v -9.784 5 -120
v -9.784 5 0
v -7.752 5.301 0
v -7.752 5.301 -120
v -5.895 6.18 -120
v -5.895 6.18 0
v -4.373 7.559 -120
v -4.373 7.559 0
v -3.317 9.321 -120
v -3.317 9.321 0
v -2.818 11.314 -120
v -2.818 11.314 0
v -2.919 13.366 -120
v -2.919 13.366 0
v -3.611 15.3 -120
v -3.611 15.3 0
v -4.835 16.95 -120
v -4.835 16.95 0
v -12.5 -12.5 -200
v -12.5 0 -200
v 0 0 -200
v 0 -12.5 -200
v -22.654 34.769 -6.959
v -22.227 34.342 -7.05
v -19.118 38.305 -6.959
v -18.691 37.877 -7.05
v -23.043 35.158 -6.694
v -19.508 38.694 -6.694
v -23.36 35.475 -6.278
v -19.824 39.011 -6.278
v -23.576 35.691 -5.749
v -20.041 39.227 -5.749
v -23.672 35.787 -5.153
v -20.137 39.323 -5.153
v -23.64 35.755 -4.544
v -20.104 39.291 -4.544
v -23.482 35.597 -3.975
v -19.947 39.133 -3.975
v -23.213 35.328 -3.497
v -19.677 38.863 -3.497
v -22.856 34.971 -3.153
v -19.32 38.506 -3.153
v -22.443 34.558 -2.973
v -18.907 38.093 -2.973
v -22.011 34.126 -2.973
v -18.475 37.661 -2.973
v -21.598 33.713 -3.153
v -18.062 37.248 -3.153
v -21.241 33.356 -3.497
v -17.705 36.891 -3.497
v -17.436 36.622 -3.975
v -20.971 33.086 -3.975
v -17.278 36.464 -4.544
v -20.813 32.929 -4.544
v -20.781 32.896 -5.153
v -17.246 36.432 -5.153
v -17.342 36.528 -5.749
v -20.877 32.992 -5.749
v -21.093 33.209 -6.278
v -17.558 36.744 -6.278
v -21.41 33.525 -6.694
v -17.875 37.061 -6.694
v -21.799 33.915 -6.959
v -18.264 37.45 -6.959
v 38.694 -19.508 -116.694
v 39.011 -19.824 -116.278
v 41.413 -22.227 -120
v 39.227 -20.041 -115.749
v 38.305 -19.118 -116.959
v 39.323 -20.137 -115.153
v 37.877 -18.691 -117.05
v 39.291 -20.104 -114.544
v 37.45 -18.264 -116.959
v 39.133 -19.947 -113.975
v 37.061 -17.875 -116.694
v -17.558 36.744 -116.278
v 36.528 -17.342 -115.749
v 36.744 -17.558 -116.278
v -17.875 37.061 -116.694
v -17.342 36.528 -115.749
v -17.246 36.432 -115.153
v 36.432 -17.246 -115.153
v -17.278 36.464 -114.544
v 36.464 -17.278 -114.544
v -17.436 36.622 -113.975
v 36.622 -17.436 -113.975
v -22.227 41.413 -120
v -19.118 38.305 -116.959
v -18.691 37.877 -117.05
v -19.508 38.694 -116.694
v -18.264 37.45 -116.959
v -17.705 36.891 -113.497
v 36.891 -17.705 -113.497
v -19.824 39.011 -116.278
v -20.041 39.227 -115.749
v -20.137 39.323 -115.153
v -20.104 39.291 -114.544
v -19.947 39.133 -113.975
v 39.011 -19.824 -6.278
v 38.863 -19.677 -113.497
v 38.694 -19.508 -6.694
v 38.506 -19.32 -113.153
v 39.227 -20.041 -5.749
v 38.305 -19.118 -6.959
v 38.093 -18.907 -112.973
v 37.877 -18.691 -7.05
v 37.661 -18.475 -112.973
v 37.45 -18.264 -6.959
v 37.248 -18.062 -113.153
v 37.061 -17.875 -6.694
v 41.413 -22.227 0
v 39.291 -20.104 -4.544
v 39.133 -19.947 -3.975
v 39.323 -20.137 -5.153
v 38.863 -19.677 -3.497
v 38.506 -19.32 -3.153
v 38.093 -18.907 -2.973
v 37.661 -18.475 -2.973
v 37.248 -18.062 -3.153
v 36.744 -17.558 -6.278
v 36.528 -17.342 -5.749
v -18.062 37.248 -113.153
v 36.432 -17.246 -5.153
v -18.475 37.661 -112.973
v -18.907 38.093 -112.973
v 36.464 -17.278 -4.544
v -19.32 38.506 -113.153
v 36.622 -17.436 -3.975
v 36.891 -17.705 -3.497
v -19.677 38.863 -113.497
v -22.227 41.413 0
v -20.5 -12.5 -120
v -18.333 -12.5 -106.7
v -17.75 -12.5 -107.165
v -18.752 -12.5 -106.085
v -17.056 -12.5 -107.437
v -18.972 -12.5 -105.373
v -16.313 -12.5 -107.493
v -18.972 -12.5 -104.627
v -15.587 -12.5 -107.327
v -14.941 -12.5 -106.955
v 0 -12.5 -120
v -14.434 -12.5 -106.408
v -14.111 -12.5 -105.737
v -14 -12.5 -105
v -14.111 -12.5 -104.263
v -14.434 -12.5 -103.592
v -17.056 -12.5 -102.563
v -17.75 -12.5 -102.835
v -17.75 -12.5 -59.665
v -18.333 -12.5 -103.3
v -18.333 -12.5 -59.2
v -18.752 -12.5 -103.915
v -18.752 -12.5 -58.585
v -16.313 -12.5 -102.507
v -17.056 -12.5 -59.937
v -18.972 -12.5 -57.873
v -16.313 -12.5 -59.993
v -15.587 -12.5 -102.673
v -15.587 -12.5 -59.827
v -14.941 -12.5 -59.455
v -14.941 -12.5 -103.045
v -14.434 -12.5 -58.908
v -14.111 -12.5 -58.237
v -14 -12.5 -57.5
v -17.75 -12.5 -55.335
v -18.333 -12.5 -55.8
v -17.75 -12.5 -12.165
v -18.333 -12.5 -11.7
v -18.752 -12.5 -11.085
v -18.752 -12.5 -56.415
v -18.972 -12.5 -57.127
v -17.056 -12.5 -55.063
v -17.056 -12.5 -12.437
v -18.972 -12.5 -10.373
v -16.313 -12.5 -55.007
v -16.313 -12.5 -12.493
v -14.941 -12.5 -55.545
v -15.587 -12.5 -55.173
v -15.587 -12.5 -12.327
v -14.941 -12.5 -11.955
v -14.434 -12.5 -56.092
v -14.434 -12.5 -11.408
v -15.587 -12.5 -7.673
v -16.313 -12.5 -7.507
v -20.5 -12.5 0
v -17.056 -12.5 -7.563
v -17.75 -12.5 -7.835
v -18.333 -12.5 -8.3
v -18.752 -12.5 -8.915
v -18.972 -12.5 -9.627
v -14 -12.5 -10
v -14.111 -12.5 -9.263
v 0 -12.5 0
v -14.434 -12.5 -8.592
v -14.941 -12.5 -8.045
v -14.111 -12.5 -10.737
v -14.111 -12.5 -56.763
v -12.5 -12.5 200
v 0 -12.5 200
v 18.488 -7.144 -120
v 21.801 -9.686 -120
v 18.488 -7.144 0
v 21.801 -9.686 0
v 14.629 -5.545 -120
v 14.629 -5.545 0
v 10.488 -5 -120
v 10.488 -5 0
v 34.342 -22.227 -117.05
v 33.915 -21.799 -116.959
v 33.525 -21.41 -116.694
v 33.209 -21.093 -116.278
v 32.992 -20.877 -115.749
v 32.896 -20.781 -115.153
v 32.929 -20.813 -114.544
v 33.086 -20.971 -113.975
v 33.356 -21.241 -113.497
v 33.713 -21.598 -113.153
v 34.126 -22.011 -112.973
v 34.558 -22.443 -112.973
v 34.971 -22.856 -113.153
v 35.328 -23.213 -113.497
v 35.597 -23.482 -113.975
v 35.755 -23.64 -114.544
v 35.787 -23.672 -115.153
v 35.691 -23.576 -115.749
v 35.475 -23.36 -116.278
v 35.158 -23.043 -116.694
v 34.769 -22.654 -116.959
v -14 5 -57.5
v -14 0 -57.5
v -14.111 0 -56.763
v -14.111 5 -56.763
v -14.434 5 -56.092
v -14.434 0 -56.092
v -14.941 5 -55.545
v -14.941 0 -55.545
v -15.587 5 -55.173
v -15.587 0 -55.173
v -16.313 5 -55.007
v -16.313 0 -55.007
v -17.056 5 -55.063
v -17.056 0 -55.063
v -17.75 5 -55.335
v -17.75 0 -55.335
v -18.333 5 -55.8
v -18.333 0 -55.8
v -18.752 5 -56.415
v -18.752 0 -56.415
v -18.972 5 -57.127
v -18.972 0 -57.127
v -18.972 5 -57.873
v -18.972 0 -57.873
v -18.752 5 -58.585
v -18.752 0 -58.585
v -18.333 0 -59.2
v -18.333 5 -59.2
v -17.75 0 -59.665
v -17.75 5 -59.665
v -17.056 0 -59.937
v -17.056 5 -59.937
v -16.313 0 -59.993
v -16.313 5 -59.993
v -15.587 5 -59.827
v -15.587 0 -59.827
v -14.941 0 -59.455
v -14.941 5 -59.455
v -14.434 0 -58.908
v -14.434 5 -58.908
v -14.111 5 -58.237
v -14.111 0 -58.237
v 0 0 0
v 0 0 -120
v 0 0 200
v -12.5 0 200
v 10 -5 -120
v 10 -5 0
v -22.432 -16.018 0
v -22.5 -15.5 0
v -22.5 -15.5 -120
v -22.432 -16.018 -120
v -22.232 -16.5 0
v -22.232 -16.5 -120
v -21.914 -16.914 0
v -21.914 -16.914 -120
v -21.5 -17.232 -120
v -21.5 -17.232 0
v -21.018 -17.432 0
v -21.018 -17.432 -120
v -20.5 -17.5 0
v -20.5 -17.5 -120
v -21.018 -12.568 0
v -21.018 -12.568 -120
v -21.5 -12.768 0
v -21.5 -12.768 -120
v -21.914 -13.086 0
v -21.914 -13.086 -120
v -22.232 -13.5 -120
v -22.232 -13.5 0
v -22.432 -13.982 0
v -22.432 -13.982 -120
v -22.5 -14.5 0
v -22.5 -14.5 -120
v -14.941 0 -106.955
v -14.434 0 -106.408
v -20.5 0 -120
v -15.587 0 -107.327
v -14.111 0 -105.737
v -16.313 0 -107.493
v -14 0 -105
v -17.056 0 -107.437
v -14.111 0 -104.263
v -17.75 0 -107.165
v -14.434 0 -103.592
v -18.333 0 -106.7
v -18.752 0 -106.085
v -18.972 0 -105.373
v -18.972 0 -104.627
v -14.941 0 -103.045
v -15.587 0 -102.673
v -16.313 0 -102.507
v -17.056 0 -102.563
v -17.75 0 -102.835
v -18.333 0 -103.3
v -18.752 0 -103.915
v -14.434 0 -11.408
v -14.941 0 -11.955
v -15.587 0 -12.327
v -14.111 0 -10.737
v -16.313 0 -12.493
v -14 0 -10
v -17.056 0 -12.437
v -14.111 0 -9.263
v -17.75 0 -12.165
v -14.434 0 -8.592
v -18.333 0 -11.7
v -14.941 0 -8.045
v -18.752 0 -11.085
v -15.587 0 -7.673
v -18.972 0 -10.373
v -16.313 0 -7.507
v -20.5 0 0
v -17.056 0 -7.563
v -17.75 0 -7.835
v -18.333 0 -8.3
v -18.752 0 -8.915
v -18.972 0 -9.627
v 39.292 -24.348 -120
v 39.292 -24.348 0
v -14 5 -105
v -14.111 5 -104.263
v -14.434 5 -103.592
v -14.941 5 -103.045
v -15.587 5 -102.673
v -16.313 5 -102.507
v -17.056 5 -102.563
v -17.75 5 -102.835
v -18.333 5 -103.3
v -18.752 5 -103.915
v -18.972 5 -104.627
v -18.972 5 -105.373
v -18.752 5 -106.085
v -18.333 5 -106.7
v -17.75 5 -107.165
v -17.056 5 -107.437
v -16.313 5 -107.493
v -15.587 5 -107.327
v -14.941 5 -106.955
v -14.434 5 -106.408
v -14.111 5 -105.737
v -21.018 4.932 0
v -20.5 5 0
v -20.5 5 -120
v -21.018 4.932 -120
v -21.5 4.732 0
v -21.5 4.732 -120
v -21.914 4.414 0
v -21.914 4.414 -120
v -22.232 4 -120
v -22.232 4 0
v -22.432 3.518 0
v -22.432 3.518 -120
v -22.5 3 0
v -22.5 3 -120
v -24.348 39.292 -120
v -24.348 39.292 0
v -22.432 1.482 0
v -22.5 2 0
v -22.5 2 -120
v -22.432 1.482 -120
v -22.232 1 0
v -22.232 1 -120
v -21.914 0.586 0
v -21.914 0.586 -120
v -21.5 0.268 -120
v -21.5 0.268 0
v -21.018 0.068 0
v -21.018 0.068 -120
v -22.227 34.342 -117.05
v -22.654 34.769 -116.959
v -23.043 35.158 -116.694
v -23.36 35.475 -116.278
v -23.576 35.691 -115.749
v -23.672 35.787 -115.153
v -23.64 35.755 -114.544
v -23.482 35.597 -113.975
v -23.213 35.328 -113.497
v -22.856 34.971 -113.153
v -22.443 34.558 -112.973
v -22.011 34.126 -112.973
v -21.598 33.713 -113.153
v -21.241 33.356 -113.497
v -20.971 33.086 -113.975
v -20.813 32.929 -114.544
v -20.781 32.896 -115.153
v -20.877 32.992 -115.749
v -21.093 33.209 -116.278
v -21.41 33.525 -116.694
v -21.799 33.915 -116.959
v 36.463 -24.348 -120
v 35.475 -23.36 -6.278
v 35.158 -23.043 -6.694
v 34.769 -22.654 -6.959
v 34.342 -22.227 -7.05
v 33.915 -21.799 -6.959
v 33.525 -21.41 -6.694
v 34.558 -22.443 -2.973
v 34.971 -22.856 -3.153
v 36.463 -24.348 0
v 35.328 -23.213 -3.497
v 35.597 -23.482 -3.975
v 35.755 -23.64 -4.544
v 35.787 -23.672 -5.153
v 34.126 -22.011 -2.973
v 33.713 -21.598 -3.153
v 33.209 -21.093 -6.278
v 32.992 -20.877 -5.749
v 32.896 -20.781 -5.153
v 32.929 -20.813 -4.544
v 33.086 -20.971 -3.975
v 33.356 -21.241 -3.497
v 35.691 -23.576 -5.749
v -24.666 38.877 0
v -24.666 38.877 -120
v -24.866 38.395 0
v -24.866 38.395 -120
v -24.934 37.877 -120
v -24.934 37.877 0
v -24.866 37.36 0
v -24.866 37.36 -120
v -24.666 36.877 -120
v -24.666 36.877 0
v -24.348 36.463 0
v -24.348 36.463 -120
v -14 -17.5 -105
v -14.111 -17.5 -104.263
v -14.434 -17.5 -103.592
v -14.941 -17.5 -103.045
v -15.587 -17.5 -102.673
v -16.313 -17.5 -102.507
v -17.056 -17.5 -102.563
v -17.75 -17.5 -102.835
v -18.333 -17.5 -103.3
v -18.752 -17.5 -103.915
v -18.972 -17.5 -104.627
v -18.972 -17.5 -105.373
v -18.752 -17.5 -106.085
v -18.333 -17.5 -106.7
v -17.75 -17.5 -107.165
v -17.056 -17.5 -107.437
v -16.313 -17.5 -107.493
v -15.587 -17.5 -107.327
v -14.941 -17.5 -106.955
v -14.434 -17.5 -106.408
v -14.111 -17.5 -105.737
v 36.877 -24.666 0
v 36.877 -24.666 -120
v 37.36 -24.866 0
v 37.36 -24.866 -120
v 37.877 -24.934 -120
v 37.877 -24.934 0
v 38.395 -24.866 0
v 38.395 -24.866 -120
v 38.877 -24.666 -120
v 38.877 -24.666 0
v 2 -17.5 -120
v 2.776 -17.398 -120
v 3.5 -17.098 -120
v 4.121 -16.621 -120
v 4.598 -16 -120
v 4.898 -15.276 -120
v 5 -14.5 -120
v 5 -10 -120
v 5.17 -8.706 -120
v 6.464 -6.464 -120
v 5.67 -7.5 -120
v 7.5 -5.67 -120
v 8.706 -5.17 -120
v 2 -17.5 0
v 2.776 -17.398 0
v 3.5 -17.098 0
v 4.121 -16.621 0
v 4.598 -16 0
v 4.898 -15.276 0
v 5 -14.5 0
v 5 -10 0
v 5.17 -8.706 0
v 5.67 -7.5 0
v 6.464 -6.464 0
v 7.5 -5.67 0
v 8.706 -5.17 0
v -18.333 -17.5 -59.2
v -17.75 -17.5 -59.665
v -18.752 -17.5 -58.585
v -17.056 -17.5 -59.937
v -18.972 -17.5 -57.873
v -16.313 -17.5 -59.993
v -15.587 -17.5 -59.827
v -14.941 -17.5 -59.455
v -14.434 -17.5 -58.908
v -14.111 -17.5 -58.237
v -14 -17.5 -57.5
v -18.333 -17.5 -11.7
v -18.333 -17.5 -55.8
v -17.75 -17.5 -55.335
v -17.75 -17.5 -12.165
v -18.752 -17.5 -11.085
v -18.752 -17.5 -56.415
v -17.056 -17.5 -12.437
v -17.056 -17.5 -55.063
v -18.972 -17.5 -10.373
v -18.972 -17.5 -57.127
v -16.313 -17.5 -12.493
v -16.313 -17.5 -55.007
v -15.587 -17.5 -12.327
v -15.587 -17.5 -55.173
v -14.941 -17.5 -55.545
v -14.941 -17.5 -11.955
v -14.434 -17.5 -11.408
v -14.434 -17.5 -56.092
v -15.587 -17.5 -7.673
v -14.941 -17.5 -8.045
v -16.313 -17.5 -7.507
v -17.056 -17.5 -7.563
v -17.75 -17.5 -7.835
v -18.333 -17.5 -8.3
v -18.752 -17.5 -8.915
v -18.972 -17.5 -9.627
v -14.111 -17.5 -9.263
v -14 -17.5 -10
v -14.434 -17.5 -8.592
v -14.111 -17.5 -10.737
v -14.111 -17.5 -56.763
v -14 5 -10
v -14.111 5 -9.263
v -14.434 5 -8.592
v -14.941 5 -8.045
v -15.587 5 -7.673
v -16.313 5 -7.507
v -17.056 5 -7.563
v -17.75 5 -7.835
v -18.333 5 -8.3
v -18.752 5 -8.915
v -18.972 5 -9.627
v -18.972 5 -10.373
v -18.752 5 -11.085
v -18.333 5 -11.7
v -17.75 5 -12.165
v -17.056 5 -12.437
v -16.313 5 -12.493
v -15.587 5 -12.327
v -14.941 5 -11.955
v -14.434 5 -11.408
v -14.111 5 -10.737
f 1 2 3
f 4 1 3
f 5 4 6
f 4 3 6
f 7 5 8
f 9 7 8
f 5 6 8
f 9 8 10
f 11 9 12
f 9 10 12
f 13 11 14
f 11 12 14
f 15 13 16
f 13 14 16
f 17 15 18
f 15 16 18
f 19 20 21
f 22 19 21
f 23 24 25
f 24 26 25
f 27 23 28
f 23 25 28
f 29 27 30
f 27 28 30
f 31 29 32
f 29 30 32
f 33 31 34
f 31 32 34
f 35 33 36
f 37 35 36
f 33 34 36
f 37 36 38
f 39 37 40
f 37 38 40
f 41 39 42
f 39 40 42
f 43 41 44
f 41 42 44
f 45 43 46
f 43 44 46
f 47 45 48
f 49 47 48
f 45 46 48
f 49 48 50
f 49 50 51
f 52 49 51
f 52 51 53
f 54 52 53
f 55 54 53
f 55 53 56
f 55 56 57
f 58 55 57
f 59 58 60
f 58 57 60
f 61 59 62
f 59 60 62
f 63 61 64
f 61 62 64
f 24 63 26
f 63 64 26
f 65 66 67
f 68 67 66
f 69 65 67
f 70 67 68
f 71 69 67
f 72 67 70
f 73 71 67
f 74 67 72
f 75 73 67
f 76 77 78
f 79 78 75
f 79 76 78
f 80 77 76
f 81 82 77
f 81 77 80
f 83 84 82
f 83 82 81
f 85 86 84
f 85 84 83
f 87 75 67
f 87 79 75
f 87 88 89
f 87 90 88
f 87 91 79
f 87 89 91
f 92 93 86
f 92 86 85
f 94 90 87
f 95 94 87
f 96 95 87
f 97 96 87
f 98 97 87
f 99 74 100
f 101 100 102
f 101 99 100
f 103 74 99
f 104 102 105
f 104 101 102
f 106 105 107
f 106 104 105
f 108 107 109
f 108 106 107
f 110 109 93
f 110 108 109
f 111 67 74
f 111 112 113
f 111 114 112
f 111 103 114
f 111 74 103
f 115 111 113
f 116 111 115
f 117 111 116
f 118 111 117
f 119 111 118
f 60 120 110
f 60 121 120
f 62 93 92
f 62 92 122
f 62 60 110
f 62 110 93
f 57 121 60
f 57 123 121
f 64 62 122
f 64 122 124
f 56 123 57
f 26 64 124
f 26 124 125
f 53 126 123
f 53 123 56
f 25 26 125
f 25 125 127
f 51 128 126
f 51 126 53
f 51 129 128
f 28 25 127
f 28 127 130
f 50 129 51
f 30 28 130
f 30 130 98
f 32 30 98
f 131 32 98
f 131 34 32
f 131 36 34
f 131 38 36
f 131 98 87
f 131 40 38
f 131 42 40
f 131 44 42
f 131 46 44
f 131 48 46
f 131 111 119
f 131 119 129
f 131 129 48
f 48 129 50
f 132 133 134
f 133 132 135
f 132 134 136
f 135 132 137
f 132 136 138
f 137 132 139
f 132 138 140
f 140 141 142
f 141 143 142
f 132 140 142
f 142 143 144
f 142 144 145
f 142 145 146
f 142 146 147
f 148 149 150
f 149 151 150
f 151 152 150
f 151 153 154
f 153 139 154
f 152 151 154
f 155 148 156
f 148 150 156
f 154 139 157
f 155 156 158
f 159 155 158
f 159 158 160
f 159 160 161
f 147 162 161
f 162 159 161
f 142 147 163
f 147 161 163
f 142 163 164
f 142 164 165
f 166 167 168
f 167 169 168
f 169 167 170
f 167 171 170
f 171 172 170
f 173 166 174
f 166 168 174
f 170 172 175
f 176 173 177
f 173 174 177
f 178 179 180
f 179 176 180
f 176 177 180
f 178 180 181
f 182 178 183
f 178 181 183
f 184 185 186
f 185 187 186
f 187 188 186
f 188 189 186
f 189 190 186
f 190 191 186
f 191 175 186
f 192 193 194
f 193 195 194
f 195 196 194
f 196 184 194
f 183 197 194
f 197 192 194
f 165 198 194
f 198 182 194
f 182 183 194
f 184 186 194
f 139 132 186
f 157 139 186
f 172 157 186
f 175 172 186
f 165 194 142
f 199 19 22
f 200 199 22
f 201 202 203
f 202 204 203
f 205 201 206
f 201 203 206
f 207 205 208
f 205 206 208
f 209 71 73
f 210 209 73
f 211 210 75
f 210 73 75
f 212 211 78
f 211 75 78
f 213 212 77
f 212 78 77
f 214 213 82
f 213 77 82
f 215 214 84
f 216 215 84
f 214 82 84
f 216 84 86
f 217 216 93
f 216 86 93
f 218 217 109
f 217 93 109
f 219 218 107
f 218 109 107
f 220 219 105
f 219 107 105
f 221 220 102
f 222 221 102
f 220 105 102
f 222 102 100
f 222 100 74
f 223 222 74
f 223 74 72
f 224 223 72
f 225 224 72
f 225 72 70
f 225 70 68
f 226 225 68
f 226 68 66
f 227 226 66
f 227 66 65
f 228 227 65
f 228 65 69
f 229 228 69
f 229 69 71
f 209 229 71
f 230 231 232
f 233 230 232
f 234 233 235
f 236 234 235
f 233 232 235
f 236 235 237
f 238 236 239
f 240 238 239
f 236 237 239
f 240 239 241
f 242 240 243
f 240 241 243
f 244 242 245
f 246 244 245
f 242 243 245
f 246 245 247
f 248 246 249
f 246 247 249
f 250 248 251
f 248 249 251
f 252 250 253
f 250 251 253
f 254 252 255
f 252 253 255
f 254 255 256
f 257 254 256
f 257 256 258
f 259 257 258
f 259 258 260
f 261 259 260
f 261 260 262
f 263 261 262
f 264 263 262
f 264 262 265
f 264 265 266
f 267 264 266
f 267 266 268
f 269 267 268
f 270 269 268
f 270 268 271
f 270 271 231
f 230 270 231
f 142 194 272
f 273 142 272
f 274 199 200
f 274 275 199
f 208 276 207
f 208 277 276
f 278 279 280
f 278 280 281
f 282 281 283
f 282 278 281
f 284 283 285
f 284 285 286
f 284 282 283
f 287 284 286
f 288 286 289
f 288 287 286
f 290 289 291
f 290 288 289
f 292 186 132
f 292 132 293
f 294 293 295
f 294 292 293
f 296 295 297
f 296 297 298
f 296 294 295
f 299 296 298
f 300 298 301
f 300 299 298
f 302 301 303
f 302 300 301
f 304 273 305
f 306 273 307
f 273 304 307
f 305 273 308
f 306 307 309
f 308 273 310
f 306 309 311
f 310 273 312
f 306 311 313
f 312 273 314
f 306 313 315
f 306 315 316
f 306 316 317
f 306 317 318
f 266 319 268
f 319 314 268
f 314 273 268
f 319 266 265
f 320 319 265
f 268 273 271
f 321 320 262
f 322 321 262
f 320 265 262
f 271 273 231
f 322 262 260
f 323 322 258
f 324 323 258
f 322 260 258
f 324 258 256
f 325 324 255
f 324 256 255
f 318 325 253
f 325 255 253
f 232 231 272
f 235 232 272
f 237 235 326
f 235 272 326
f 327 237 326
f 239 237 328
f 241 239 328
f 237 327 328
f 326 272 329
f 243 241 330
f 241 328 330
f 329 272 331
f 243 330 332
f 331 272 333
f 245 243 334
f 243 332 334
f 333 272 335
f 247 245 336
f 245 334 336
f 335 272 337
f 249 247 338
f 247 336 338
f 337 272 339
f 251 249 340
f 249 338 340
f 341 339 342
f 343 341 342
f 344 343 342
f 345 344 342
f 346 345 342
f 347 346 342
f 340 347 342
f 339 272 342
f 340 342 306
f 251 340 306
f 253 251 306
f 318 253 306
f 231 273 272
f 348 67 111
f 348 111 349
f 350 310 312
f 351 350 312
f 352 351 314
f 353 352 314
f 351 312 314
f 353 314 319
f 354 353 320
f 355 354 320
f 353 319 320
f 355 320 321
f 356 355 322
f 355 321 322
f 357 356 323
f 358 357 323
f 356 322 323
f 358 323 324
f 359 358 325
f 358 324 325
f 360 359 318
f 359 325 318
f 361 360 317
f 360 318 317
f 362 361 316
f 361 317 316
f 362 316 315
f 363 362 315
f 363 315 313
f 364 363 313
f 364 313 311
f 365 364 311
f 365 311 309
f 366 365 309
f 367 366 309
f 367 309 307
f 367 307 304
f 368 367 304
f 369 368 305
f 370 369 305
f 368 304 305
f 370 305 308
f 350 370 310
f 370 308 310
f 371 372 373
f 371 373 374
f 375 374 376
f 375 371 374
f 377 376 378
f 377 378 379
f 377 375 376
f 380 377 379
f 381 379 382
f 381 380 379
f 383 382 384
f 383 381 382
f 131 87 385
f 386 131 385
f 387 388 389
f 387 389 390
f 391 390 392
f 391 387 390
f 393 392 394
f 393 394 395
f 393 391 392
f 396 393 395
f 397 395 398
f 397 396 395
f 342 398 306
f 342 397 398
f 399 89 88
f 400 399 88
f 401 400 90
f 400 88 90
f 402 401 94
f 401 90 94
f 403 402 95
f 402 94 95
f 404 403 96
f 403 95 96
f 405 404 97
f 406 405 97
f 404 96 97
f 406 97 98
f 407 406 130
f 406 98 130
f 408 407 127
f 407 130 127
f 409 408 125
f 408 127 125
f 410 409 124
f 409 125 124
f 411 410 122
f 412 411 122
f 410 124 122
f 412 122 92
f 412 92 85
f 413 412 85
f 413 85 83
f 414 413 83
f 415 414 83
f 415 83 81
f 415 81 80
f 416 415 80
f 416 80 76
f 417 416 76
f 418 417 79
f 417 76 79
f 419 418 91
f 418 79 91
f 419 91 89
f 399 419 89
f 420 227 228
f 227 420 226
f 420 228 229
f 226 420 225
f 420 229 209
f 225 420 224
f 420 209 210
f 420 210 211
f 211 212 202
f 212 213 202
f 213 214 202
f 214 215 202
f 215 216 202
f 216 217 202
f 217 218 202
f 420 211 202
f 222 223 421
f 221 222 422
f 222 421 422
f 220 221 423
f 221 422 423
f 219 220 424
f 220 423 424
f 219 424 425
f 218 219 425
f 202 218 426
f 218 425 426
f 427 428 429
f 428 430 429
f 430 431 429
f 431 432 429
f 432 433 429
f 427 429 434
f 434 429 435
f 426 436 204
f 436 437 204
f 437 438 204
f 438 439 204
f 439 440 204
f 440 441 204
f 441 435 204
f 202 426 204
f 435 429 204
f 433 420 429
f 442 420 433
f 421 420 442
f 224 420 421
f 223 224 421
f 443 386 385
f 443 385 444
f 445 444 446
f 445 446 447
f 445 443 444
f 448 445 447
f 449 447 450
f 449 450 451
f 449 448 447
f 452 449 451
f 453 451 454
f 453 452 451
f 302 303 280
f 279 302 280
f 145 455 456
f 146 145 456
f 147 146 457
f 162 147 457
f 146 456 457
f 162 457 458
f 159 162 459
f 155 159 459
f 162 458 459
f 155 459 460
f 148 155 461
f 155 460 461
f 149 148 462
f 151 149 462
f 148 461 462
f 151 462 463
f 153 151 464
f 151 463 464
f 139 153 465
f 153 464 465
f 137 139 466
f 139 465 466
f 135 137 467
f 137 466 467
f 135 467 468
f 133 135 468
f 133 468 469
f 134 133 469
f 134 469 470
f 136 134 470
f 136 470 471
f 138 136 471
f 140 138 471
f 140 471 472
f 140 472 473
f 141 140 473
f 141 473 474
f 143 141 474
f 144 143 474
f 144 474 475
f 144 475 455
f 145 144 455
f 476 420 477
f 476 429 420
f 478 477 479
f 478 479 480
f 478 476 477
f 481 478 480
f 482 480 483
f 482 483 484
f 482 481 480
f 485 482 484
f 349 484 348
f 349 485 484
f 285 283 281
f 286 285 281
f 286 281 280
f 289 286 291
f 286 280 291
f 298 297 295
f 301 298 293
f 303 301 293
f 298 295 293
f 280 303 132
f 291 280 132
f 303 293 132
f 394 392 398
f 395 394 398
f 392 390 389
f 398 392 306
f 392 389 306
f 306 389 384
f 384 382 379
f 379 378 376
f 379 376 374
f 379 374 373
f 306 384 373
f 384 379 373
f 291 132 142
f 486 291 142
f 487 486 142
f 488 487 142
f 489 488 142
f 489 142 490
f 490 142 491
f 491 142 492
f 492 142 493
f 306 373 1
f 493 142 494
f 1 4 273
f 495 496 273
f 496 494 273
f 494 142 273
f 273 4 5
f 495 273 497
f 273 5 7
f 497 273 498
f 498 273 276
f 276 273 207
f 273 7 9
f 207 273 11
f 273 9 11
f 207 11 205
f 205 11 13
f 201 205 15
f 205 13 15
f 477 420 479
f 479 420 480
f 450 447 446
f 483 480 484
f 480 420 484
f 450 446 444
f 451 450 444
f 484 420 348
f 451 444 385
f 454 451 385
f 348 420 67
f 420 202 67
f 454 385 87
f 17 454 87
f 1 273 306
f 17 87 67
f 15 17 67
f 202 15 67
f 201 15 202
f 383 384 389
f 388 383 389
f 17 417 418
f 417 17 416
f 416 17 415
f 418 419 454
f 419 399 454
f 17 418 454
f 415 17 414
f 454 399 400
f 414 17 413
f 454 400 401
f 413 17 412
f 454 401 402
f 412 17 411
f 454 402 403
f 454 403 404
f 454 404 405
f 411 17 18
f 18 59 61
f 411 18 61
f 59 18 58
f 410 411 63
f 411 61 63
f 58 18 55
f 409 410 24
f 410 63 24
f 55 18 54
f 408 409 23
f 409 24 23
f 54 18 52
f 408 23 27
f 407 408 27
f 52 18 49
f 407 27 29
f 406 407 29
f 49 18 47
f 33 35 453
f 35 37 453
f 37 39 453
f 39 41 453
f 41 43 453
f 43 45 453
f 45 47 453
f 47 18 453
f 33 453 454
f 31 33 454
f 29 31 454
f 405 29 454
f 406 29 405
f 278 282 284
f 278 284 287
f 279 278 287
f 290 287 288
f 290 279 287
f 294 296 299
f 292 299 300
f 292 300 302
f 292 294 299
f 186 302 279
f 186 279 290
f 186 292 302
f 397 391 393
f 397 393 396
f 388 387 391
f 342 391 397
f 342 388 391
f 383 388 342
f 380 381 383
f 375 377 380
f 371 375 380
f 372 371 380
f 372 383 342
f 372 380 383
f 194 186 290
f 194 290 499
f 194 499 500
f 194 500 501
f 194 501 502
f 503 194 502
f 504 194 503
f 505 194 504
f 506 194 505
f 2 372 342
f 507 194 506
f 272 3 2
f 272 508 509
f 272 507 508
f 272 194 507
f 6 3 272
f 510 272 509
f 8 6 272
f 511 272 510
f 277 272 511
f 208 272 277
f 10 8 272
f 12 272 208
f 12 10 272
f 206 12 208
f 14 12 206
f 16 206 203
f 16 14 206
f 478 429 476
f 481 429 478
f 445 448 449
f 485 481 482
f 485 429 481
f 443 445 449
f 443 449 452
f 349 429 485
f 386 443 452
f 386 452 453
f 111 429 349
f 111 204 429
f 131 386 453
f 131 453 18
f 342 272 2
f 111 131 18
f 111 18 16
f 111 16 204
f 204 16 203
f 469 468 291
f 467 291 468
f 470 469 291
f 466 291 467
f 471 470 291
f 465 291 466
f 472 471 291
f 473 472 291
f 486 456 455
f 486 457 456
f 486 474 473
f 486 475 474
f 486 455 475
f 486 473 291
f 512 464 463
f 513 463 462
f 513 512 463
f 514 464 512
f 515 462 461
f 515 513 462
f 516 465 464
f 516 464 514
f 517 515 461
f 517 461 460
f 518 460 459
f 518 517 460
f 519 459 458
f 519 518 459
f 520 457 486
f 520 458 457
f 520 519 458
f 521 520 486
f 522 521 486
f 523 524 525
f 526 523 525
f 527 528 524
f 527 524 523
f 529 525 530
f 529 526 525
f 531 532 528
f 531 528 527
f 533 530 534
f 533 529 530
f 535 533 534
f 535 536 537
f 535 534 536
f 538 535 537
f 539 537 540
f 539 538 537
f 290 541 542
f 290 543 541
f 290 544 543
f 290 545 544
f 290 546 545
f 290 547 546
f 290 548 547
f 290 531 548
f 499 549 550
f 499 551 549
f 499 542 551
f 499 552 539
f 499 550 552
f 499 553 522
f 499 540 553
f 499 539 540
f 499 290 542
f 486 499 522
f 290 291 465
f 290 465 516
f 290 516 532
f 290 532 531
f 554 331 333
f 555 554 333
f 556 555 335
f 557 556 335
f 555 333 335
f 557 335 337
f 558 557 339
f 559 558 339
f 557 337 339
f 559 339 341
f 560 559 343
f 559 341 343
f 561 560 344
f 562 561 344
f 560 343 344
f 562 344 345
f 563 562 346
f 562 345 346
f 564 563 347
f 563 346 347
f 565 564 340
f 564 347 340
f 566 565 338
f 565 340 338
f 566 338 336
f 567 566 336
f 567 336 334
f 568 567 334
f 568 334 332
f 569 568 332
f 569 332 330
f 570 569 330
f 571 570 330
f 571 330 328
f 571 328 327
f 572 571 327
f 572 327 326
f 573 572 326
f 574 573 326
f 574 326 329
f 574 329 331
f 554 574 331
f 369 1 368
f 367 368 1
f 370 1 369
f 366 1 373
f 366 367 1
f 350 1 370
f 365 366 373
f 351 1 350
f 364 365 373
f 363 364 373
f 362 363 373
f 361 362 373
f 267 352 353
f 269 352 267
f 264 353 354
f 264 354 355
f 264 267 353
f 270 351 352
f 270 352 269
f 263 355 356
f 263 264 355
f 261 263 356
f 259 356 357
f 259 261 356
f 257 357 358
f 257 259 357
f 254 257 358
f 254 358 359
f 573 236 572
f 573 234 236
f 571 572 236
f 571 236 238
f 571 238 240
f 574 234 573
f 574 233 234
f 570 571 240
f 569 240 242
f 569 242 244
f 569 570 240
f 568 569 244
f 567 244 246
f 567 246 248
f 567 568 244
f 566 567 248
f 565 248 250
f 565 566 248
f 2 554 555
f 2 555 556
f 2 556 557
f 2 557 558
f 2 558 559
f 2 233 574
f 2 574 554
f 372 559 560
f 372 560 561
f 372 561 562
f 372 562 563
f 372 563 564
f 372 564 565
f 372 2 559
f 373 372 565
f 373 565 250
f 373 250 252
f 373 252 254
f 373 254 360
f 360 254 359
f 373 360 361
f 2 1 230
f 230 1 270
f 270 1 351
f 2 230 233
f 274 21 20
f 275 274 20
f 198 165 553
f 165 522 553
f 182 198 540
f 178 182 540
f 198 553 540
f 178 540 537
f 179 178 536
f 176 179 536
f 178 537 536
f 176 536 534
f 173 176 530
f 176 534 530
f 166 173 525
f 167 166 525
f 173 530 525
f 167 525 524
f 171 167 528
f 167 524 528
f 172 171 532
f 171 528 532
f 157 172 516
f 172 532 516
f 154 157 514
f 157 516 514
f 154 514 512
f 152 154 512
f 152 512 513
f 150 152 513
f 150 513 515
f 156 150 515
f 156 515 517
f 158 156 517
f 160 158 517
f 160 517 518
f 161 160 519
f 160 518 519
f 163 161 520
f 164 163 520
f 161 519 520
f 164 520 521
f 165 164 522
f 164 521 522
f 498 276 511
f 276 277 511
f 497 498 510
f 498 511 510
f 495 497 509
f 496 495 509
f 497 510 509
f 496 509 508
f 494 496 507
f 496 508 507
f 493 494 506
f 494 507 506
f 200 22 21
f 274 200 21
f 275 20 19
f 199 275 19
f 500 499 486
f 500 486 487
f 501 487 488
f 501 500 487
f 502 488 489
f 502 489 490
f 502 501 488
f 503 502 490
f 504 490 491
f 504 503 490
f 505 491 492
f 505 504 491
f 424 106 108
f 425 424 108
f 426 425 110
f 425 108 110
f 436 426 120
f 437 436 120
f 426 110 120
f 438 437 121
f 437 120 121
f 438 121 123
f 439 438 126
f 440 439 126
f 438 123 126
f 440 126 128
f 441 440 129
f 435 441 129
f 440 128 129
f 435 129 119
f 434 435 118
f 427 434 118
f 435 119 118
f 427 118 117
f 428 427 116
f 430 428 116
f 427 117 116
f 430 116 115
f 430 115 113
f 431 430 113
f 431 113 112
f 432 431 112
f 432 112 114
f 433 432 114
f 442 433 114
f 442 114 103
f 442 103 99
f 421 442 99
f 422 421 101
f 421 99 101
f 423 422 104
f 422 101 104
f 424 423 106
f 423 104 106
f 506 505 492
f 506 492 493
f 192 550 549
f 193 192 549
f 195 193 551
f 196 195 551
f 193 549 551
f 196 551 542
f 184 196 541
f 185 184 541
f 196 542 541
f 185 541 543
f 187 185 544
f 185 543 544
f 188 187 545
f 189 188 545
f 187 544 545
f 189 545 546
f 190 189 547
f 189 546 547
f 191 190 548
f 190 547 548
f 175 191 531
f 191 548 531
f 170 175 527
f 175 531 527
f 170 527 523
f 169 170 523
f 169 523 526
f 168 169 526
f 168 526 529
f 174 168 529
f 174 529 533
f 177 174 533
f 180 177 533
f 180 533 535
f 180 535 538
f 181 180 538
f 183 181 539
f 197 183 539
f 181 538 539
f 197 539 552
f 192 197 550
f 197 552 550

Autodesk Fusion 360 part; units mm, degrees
sketch "Sketch1" plane through (0, 0, 0) normal (0, 0, 1) x (1, 0, 0)
  line L0 (0, 0) -> (12.5, 0)
  line L1 (12.5, 0) -> (12.5, 12.5)
  line L2 (12.5, 12.5) -> (0, 12.5)
  line L3 (0, 12.5) -> (0, 0)
  line L4 (-15, 12.5) -> (25.5711, 12.5)
  line L5 (17.3964, -5) -> (-5, -5)
  line L6 (-15, 7.5) -> (-15, 12.5)
  line L7 (-15, -5) -> (-5, -5)
  line L8 (-5, -5) -> (-5, 7.5)
  line L9 (-5, 7.5) -> (-15, 7.5)
  line L10 (17.5, -5) -> (17.5, 7.5)
  line L11 (17.5, 7.5) -> (23.5, 7.5)
  line L12 (17.5, -4.8205) -> (17.3964, -5)
  line L13 (-15, 12.5) -> (18.5, 12.5)
  line L14 (19.5711, 18.5) -> (-15, 18.5)
  line L15 (-15, 18.5) -> (-15, 12.5)
  line L16 (12.5, 18.5) -> (-8.7132, 39.7132)
  line L17 (12.5, 18.5) -> (19.5711, 18.5) construction
  line L18 (12.5, 18.5) -> (54.9264, -23.9264)
  line L19 (-8.7132, 39.7132) -> (-5.1777, 43.2487)
  line L20 (-5.1777, 43.2487) -> (61.9975, -23.9264)
  line L21 (54.9264, -23.9264) -> (61.9975, -23.9264)
  line L22 (12.5, 18.5) -> (19.5711, 18.5) construction
  line L23 (45, 18.5) -> (72.5, 18.5) construction
  dimension "d1" = 12.5
  dimension "d2" = 12.5
  dimension "d3" = 5
  dimension "d4" = 12.5
  dimension "d5" = 15
  dimension "d10" = 5
  dimension "d11" = 5
  dimension "d12" = 5
  dimension "d13" = 5
  dimension "d15" = 6
  dimension "d16" = 135
  dimension "d17" = 30
  dimension "d18" = 45
  dimension "d19" = 60
  dimension "d20" = 5
sketch "Sketch2" plane through (0, 0, 0) normal (0, 0, 1) x (1, 0, 0)
  line L0 (0, 0) -> (-20.5, 0)
  line L1 (-12.5, 0) -> (-12.5, -12.5)
  line L2 (-20.5, -12.5) -> (0, -12.5)
  line L3 (0, -12.5) -> (0, 0)
  line L4 (-9.7844, 5) -> (-20.5, 5)
  line L5 (-20.5, -17.5) -> (2, -17.5)
  line L6 (-22.5, 3) -> (-22.5, 2)
  line L7 (-22.5, -14.5) -> (-22.5, -15.5)
  line L8 (7.1151, 5) -> (37.353, 5) construction
  line L9 (41.4129, -22.2267) -> (-22.2267, 41.4129)
  line L10 (5, -21) -> (5, -20)
  line L11 (-22.2267, 41.4129) -> (-24.348, 39.2916)
  line L12 (41.4129, -22.2267) -> (39.2916, -24.348)
  line L13 (10, -5) -> (10.4877, -5)
  line L14 (5, -14.5) -> (5, -10)
  line L15 (36.4631, -24.348) -> (21.8014, -9.6863)
  line L16 (-4.8346, 16.9497) -> (-24.348, 36.4631)
  arc A0 (-9.7844, 5) -> (-4.8346, 16.9497) centre (-9.7844, 12) ccw
  arc A1 (2, -17.5) -> (5, -14.5) centre (2, -14.5) ccw
  arc A2 (-22.5, -15.5) -> (-20.5, -17.5) centre (-20.5, -15.5) ccw
  arc A3 (-20.5, -12.5) -> (-22.5, -14.5) centre (-20.5, -14.5) ccw
  arc A4 (-22.5, 2) -> (-20.5, 0) centre (-20.5, 2) ccw
  arc A5 (-20.5, 5) -> (-22.5, 3) centre (-20.5, 3) ccw
  arc A6 (-24.348, 39.2916) -> (-24.348, 36.4631) centre (-22.9338, 37.8774) ccw
  arc A7 (36.4631, -24.348) -> (39.2916, -24.348) centre (37.8774, -22.9338) ccw
  arc A8 (10, -5) -> (5, -10) centre (10, -10) ccw
  arc A9 (21.8014, -9.6863) -> (10.4877, -5) centre (10.4877, -21) ccw
  point P0 (-25.7622, 37.8774)
  point P1 (37.8774, -25.7622)
  dimension "d21" = 12.5
  dimension "d22" = 12.5
  dimension "d23" = 5
  dimension "d24" = 5
  dimension "d25" = 10
  dimension "d26" = 135
  dimension "d29" = 90
  dimension "d30" = 5
  dimension "d31" = 5
  dimension "d32" = 7
  dimension "d33" = 3
  dimension "d34" = 2
  dimension "d35" = 2
  dimension "d36" = 45
  dimension "d37" = 5
  dimension "d38" = 16
extrude "Extrude1" add sketch "Sketch2" against normal blind 120 contours L0 L2 L3 L4 L5 L6 L7 L9 L11 L12 L13 L14 L15 L16 A0 A1 A2 A3 A4 A5 A6 A7 A8 A9 makes body 1
extrude "Extrude2" add sketch "Sketch2" along normal blind 200 and the other way blind 200 separate body contours L0 L1 L2 L3 makes body 2
sketch "Sketch3" plane through (9.5931, 9.5931, 0) normal (0.7071, 0.7071, 0) x (0, 0, -1)
  line L0 (0, 45) -> (0, -45)
  line L1 (0, -45) -> (120, -45)
  line L2 (120, -45) -> (120, 45)
  line L3 (120, 45) -> (0, 45)
  line L4 (0, -45) -> (120, -45)
  line L5 (120, -45) -> (120, -40)
  line L6 (120, -40) -> (0, -40)
  line L7 (0, -40) -> (0, -45)
  dimension "d45" = 120
  dimension "d46" = 5
sketch "Sketch4" plane through (0, -17.5, 0) normal (0, -1, 0) x (1, 0, 0)
  line L0 (2, -120) -> (2, 0)
  line L1 (2, 0) -> (-20.5, 0)
  line L2 (-20.5, 0) -> (-20.5, -120)
  circle A0 centre (-16.5, -10) radius 2.5
  circle A1 centre (-16.5, -57.5) radius 2.5
  circle A2 centre (-16.5, -105) radius 2.5
  line L3 (-20.5, -120) -> (2, -120)
  dimension "d57" = 5
  dimension "d58" = 10
  dimension "d59" = 16.5
  dimension "d62" = 0
  dimension "d63" = -95
extrude "Extrude4" cut sketch "Sketch4" against normal blind 30 contours A0 | A1 | A2 bodies 1
sketch "Sketch5" plane through (9.5931, 9.5931, 0) normal (0.7071, 0.7071, 0) x (0, 0, -1)
  line L0 (0, 45) -> (0, -45)
  line L1 (0, -45) -> (120, -45)
  line L2 (120, -45) -> (120, 45)
  line L3 (120, 45) -> (0, 45)
  circle A0 centre (5, 40) radius 2.05
  line L4 (10, 35) -> (110, 35)
  line L5 (110, 35) -> (110, -35)
  line L6 (110, -35) -> (10, -35)
  line L7 (10, -35) -> (10, 35)
  circle A1 centre (115, 40) radius 2.05
  circle A2 centre (5, -40) radius 2.05
  circle A3 centre (115, -40) radius 2.05
  dimension "d66" = 4.1
  dimension "d67" = 100
  dimension "d68" = 70
  dimension "d69" = 10
  dimension "d70" = 5
  dimension "d71" = 5
  dimension "d74" = 110
  dimension "d75" = -80
extrude "Extrude5" cut sketch "Sketch5" against normal blind 15 contours A0 | A1 | A2 | A3 bodies 1
